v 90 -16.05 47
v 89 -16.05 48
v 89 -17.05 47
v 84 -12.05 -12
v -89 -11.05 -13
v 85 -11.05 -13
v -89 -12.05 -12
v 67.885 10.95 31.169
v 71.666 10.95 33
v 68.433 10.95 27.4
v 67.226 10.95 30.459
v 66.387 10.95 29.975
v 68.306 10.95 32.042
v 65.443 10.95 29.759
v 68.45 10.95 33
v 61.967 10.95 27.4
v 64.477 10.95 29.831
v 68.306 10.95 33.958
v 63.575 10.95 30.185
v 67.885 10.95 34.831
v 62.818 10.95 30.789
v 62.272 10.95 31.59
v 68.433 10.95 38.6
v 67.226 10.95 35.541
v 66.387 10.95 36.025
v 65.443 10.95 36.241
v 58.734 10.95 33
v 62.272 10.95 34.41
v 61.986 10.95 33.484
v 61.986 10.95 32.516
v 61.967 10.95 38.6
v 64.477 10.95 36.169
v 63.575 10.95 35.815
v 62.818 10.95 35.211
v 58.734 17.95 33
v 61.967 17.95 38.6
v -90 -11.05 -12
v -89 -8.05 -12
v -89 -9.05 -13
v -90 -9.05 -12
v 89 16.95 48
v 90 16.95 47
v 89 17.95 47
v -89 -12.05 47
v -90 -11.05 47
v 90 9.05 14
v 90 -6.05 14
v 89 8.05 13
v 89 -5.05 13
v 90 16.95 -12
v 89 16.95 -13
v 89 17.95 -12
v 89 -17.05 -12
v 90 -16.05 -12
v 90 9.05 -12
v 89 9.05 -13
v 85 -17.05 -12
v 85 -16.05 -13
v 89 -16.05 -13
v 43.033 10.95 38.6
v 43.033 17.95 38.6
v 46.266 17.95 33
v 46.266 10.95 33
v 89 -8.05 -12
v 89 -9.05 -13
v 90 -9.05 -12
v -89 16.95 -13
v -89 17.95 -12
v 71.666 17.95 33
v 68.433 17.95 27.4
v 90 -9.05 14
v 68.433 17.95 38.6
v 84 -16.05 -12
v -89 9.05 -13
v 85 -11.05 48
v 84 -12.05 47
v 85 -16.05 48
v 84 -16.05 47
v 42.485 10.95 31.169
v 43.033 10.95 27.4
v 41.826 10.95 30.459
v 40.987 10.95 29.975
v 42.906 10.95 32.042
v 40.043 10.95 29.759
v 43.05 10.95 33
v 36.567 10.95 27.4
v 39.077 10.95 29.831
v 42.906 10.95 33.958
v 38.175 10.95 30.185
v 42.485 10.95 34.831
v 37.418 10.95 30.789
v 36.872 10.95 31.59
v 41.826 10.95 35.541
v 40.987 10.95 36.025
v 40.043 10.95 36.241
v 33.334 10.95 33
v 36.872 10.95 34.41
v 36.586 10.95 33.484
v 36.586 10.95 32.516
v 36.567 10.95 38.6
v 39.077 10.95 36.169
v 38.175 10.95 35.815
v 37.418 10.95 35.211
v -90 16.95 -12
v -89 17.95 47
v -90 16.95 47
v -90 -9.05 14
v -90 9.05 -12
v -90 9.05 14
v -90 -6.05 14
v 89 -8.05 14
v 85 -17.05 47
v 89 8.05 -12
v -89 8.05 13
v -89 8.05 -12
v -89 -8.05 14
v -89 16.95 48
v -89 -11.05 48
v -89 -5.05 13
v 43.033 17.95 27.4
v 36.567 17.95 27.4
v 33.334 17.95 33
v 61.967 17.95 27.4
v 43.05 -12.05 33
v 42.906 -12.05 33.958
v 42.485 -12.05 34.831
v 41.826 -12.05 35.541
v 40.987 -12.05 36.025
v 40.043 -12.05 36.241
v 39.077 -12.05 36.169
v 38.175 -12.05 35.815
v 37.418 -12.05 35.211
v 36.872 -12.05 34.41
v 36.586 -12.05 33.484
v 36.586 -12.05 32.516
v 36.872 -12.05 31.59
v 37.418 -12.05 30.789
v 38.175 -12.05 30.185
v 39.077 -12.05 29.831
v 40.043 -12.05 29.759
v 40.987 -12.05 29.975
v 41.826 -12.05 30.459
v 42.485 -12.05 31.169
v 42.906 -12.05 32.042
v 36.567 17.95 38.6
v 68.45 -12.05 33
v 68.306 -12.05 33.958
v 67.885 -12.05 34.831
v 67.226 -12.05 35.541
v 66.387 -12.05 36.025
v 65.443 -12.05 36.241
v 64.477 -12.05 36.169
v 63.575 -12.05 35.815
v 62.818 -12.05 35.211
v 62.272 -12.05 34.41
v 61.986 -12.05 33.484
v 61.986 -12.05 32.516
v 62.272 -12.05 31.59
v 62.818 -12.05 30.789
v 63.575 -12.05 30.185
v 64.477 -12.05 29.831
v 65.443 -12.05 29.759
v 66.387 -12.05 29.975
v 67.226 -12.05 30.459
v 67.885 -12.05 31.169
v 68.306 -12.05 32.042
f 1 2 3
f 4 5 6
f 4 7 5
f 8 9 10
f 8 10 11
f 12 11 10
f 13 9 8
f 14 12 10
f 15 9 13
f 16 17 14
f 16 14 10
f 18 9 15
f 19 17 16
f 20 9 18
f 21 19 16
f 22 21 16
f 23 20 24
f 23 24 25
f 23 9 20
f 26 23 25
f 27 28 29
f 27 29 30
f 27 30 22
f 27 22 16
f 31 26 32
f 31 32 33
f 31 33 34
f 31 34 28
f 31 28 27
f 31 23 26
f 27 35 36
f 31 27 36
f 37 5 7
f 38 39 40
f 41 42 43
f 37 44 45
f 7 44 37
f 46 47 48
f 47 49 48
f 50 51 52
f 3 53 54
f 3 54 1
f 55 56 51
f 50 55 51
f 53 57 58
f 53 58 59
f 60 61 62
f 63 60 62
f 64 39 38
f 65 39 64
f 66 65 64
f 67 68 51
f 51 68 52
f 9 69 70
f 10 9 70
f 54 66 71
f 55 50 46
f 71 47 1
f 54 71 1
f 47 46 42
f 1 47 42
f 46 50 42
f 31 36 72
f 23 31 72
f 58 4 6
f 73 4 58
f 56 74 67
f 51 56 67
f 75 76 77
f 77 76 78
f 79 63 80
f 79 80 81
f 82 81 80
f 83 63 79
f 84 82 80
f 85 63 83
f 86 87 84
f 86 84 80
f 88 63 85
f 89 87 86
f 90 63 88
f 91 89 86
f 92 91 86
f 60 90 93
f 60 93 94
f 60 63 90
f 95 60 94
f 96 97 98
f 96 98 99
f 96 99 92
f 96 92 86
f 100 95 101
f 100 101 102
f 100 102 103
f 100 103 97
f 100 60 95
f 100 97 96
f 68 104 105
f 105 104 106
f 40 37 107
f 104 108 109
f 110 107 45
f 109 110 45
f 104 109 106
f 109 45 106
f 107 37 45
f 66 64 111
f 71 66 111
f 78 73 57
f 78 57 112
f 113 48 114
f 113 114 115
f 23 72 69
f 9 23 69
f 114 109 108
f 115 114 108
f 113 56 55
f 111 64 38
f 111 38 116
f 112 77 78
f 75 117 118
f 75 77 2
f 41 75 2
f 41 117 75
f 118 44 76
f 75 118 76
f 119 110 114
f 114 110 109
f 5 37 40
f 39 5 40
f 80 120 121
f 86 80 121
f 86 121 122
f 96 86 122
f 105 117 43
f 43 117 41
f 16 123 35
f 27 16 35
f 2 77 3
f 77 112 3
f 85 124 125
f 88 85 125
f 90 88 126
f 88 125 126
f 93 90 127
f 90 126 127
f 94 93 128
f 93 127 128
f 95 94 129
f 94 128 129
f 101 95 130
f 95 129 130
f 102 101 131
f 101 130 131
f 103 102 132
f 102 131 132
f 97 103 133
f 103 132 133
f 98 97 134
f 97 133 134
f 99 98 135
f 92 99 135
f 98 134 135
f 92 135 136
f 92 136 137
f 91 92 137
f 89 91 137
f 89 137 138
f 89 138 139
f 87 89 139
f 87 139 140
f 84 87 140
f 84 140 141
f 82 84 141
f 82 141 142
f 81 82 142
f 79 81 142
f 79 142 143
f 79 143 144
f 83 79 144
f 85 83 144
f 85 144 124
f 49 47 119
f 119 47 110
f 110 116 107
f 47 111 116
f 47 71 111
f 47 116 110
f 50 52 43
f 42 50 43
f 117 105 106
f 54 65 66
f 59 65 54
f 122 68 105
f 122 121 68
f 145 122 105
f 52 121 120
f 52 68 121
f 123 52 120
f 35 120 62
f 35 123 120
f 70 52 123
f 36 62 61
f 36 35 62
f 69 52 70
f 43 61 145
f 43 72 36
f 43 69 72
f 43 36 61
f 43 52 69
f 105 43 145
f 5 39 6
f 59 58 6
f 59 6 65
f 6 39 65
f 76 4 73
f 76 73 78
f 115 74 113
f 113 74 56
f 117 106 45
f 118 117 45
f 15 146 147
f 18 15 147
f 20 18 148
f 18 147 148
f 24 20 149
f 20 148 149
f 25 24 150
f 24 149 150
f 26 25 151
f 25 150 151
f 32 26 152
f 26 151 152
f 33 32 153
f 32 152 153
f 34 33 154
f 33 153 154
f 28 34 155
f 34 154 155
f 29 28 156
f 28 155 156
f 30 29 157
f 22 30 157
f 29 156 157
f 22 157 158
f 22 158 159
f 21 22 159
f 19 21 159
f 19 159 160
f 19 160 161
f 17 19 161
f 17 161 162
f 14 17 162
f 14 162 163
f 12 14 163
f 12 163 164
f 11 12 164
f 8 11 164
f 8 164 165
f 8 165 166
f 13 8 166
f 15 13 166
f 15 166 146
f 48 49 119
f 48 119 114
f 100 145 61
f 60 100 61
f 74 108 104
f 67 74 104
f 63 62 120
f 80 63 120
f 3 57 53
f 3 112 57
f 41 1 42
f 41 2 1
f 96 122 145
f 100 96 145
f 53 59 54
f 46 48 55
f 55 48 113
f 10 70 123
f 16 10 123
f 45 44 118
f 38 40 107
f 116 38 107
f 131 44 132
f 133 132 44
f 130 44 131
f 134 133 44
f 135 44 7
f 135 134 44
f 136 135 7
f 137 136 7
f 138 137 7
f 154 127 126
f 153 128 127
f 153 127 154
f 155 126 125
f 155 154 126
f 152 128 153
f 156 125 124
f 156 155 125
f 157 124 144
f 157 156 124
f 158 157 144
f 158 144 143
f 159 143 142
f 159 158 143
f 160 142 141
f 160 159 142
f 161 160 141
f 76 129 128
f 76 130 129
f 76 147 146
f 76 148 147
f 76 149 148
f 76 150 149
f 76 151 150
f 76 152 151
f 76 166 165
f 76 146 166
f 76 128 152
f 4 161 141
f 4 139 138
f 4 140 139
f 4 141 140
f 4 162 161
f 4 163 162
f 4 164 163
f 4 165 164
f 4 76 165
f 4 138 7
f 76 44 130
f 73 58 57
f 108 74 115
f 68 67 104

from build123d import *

# Parameters (mm, degrees)
F1_DEPTH = 90
F2_W     = 6
F2_H     = 61
F3_DEPTH = 5
F4_R     = 3.25
F5_DEPTH = 30.001
F7_DEPTH = 7
F8_SIZE  = 0.99999
F9_SIZE  = 1


# Not quite as in the source:
# - a fillet or chamfer is up to 0.001 mm smaller than in the source, because OpenCascade refuses the exact size


with BuildPart() as f1:
    # F0 (on Right) → F1 (new body, symmetric)
    with BuildSketch(Plane.YZ):
        Polygon((-6.05, 13), (8.05, 13), (8.05, -13), (17.95, -13), (17.95, 48), (-12.05, 48), (-12.05, -13), (-8.05, -13), (-8.05, 14), (-6.05, 14), align=None)
    extrude(amount=F1_DEPTH, both=True)

    # F2 (on face) → F3 (join)
    with BuildSketch(Plane.XZ.offset(12.05)):
        with Locations((87, 17.5)):
            Rectangle(F2_W, F2_H)
    extrude(amount=F3_DEPTH)

    # F4 (on face) → F5 (cut, through all)
    with BuildSketch(Plane.XZ.offset(12.05)):
        with Locations((39.8, 33)):
            Circle(F4_R)
        with Locations((65.2, 33)):
            Circle(F4_R)
    extrude(amount=-F5_DEPTH, mode=Mode.SUBTRACT)

    # F6 (on face) → F7 (cut)
    with BuildSketch(Plane(origin=(0, 17.95, 0), x_dir=(-1, 0, 0), z_dir=(0, 1, 0))):
        Polygon((-61.9668384925, 38.6), (-68.4331615075, 38.6), (-71.6663230149, 33), (-68.4331615075, 27.4), (-61.9668384925, 27.4), (-58.7336769851, 33), align=None)
        Polygon((-36.5668384925, 38.6), (-43.0331615075, 38.6), (-46.2663230149, 33), (-43.0331615075, 27.4), (-36.5668384925, 27.4), (-33.3336769851, 33), align=None)
    extrude(amount=-F7_DEPTH, mode=Mode.SUBTRACT)

    # F8 (size 1 in the source; OpenCascade refuses exactly that, so slightly less here)
    f8_edges = [f1.edges().sort_by_distance(p)[0] for p in [
        (0, -6.05, 13),
    ]]
    chamfer(f8_edges, length=F8_SIZE)

    # F9
    f9_edges = [f1.edges().sort_by_distance(p)[0] for p in [
        (0, -8.05, -13),
        (0, 8.05, -13),
        (0, 17.95, -13),
        (-90, 13, -13),
        (-90, 8.05, 0),
        (90, 13, -13),
        (-3, -12.05, -13),
        (-90, -10.05, -13),
        (84, -14.55, -13),
        (90, -12.55, -13),
        (87, -17.05, -13),
        (-90, -12.05, 17.5),
        (-90, 17.95, 17.5),
        (-90, -8.05, 0.5),
        (90, 8.05, 0),
        (90, -8.05, 0.5),
        (90, 1.499995, 13),
        (-90, 1.499995, 13),
        (90, 0.45, 48),
        (90, 17.95, 17.5),
        (0, 17.95, 48),
        (-3, -12.05, 48),
        (-90, 2.95, 48),
        (87, -17.05, 48),
        (84, -14.55, 48),
        (90, -17.05, 17.5),
        (84, -17.05, 17.5),
    ]]
    chamfer(f9_edges, length=F9_SIZE)


solid = f1.part
